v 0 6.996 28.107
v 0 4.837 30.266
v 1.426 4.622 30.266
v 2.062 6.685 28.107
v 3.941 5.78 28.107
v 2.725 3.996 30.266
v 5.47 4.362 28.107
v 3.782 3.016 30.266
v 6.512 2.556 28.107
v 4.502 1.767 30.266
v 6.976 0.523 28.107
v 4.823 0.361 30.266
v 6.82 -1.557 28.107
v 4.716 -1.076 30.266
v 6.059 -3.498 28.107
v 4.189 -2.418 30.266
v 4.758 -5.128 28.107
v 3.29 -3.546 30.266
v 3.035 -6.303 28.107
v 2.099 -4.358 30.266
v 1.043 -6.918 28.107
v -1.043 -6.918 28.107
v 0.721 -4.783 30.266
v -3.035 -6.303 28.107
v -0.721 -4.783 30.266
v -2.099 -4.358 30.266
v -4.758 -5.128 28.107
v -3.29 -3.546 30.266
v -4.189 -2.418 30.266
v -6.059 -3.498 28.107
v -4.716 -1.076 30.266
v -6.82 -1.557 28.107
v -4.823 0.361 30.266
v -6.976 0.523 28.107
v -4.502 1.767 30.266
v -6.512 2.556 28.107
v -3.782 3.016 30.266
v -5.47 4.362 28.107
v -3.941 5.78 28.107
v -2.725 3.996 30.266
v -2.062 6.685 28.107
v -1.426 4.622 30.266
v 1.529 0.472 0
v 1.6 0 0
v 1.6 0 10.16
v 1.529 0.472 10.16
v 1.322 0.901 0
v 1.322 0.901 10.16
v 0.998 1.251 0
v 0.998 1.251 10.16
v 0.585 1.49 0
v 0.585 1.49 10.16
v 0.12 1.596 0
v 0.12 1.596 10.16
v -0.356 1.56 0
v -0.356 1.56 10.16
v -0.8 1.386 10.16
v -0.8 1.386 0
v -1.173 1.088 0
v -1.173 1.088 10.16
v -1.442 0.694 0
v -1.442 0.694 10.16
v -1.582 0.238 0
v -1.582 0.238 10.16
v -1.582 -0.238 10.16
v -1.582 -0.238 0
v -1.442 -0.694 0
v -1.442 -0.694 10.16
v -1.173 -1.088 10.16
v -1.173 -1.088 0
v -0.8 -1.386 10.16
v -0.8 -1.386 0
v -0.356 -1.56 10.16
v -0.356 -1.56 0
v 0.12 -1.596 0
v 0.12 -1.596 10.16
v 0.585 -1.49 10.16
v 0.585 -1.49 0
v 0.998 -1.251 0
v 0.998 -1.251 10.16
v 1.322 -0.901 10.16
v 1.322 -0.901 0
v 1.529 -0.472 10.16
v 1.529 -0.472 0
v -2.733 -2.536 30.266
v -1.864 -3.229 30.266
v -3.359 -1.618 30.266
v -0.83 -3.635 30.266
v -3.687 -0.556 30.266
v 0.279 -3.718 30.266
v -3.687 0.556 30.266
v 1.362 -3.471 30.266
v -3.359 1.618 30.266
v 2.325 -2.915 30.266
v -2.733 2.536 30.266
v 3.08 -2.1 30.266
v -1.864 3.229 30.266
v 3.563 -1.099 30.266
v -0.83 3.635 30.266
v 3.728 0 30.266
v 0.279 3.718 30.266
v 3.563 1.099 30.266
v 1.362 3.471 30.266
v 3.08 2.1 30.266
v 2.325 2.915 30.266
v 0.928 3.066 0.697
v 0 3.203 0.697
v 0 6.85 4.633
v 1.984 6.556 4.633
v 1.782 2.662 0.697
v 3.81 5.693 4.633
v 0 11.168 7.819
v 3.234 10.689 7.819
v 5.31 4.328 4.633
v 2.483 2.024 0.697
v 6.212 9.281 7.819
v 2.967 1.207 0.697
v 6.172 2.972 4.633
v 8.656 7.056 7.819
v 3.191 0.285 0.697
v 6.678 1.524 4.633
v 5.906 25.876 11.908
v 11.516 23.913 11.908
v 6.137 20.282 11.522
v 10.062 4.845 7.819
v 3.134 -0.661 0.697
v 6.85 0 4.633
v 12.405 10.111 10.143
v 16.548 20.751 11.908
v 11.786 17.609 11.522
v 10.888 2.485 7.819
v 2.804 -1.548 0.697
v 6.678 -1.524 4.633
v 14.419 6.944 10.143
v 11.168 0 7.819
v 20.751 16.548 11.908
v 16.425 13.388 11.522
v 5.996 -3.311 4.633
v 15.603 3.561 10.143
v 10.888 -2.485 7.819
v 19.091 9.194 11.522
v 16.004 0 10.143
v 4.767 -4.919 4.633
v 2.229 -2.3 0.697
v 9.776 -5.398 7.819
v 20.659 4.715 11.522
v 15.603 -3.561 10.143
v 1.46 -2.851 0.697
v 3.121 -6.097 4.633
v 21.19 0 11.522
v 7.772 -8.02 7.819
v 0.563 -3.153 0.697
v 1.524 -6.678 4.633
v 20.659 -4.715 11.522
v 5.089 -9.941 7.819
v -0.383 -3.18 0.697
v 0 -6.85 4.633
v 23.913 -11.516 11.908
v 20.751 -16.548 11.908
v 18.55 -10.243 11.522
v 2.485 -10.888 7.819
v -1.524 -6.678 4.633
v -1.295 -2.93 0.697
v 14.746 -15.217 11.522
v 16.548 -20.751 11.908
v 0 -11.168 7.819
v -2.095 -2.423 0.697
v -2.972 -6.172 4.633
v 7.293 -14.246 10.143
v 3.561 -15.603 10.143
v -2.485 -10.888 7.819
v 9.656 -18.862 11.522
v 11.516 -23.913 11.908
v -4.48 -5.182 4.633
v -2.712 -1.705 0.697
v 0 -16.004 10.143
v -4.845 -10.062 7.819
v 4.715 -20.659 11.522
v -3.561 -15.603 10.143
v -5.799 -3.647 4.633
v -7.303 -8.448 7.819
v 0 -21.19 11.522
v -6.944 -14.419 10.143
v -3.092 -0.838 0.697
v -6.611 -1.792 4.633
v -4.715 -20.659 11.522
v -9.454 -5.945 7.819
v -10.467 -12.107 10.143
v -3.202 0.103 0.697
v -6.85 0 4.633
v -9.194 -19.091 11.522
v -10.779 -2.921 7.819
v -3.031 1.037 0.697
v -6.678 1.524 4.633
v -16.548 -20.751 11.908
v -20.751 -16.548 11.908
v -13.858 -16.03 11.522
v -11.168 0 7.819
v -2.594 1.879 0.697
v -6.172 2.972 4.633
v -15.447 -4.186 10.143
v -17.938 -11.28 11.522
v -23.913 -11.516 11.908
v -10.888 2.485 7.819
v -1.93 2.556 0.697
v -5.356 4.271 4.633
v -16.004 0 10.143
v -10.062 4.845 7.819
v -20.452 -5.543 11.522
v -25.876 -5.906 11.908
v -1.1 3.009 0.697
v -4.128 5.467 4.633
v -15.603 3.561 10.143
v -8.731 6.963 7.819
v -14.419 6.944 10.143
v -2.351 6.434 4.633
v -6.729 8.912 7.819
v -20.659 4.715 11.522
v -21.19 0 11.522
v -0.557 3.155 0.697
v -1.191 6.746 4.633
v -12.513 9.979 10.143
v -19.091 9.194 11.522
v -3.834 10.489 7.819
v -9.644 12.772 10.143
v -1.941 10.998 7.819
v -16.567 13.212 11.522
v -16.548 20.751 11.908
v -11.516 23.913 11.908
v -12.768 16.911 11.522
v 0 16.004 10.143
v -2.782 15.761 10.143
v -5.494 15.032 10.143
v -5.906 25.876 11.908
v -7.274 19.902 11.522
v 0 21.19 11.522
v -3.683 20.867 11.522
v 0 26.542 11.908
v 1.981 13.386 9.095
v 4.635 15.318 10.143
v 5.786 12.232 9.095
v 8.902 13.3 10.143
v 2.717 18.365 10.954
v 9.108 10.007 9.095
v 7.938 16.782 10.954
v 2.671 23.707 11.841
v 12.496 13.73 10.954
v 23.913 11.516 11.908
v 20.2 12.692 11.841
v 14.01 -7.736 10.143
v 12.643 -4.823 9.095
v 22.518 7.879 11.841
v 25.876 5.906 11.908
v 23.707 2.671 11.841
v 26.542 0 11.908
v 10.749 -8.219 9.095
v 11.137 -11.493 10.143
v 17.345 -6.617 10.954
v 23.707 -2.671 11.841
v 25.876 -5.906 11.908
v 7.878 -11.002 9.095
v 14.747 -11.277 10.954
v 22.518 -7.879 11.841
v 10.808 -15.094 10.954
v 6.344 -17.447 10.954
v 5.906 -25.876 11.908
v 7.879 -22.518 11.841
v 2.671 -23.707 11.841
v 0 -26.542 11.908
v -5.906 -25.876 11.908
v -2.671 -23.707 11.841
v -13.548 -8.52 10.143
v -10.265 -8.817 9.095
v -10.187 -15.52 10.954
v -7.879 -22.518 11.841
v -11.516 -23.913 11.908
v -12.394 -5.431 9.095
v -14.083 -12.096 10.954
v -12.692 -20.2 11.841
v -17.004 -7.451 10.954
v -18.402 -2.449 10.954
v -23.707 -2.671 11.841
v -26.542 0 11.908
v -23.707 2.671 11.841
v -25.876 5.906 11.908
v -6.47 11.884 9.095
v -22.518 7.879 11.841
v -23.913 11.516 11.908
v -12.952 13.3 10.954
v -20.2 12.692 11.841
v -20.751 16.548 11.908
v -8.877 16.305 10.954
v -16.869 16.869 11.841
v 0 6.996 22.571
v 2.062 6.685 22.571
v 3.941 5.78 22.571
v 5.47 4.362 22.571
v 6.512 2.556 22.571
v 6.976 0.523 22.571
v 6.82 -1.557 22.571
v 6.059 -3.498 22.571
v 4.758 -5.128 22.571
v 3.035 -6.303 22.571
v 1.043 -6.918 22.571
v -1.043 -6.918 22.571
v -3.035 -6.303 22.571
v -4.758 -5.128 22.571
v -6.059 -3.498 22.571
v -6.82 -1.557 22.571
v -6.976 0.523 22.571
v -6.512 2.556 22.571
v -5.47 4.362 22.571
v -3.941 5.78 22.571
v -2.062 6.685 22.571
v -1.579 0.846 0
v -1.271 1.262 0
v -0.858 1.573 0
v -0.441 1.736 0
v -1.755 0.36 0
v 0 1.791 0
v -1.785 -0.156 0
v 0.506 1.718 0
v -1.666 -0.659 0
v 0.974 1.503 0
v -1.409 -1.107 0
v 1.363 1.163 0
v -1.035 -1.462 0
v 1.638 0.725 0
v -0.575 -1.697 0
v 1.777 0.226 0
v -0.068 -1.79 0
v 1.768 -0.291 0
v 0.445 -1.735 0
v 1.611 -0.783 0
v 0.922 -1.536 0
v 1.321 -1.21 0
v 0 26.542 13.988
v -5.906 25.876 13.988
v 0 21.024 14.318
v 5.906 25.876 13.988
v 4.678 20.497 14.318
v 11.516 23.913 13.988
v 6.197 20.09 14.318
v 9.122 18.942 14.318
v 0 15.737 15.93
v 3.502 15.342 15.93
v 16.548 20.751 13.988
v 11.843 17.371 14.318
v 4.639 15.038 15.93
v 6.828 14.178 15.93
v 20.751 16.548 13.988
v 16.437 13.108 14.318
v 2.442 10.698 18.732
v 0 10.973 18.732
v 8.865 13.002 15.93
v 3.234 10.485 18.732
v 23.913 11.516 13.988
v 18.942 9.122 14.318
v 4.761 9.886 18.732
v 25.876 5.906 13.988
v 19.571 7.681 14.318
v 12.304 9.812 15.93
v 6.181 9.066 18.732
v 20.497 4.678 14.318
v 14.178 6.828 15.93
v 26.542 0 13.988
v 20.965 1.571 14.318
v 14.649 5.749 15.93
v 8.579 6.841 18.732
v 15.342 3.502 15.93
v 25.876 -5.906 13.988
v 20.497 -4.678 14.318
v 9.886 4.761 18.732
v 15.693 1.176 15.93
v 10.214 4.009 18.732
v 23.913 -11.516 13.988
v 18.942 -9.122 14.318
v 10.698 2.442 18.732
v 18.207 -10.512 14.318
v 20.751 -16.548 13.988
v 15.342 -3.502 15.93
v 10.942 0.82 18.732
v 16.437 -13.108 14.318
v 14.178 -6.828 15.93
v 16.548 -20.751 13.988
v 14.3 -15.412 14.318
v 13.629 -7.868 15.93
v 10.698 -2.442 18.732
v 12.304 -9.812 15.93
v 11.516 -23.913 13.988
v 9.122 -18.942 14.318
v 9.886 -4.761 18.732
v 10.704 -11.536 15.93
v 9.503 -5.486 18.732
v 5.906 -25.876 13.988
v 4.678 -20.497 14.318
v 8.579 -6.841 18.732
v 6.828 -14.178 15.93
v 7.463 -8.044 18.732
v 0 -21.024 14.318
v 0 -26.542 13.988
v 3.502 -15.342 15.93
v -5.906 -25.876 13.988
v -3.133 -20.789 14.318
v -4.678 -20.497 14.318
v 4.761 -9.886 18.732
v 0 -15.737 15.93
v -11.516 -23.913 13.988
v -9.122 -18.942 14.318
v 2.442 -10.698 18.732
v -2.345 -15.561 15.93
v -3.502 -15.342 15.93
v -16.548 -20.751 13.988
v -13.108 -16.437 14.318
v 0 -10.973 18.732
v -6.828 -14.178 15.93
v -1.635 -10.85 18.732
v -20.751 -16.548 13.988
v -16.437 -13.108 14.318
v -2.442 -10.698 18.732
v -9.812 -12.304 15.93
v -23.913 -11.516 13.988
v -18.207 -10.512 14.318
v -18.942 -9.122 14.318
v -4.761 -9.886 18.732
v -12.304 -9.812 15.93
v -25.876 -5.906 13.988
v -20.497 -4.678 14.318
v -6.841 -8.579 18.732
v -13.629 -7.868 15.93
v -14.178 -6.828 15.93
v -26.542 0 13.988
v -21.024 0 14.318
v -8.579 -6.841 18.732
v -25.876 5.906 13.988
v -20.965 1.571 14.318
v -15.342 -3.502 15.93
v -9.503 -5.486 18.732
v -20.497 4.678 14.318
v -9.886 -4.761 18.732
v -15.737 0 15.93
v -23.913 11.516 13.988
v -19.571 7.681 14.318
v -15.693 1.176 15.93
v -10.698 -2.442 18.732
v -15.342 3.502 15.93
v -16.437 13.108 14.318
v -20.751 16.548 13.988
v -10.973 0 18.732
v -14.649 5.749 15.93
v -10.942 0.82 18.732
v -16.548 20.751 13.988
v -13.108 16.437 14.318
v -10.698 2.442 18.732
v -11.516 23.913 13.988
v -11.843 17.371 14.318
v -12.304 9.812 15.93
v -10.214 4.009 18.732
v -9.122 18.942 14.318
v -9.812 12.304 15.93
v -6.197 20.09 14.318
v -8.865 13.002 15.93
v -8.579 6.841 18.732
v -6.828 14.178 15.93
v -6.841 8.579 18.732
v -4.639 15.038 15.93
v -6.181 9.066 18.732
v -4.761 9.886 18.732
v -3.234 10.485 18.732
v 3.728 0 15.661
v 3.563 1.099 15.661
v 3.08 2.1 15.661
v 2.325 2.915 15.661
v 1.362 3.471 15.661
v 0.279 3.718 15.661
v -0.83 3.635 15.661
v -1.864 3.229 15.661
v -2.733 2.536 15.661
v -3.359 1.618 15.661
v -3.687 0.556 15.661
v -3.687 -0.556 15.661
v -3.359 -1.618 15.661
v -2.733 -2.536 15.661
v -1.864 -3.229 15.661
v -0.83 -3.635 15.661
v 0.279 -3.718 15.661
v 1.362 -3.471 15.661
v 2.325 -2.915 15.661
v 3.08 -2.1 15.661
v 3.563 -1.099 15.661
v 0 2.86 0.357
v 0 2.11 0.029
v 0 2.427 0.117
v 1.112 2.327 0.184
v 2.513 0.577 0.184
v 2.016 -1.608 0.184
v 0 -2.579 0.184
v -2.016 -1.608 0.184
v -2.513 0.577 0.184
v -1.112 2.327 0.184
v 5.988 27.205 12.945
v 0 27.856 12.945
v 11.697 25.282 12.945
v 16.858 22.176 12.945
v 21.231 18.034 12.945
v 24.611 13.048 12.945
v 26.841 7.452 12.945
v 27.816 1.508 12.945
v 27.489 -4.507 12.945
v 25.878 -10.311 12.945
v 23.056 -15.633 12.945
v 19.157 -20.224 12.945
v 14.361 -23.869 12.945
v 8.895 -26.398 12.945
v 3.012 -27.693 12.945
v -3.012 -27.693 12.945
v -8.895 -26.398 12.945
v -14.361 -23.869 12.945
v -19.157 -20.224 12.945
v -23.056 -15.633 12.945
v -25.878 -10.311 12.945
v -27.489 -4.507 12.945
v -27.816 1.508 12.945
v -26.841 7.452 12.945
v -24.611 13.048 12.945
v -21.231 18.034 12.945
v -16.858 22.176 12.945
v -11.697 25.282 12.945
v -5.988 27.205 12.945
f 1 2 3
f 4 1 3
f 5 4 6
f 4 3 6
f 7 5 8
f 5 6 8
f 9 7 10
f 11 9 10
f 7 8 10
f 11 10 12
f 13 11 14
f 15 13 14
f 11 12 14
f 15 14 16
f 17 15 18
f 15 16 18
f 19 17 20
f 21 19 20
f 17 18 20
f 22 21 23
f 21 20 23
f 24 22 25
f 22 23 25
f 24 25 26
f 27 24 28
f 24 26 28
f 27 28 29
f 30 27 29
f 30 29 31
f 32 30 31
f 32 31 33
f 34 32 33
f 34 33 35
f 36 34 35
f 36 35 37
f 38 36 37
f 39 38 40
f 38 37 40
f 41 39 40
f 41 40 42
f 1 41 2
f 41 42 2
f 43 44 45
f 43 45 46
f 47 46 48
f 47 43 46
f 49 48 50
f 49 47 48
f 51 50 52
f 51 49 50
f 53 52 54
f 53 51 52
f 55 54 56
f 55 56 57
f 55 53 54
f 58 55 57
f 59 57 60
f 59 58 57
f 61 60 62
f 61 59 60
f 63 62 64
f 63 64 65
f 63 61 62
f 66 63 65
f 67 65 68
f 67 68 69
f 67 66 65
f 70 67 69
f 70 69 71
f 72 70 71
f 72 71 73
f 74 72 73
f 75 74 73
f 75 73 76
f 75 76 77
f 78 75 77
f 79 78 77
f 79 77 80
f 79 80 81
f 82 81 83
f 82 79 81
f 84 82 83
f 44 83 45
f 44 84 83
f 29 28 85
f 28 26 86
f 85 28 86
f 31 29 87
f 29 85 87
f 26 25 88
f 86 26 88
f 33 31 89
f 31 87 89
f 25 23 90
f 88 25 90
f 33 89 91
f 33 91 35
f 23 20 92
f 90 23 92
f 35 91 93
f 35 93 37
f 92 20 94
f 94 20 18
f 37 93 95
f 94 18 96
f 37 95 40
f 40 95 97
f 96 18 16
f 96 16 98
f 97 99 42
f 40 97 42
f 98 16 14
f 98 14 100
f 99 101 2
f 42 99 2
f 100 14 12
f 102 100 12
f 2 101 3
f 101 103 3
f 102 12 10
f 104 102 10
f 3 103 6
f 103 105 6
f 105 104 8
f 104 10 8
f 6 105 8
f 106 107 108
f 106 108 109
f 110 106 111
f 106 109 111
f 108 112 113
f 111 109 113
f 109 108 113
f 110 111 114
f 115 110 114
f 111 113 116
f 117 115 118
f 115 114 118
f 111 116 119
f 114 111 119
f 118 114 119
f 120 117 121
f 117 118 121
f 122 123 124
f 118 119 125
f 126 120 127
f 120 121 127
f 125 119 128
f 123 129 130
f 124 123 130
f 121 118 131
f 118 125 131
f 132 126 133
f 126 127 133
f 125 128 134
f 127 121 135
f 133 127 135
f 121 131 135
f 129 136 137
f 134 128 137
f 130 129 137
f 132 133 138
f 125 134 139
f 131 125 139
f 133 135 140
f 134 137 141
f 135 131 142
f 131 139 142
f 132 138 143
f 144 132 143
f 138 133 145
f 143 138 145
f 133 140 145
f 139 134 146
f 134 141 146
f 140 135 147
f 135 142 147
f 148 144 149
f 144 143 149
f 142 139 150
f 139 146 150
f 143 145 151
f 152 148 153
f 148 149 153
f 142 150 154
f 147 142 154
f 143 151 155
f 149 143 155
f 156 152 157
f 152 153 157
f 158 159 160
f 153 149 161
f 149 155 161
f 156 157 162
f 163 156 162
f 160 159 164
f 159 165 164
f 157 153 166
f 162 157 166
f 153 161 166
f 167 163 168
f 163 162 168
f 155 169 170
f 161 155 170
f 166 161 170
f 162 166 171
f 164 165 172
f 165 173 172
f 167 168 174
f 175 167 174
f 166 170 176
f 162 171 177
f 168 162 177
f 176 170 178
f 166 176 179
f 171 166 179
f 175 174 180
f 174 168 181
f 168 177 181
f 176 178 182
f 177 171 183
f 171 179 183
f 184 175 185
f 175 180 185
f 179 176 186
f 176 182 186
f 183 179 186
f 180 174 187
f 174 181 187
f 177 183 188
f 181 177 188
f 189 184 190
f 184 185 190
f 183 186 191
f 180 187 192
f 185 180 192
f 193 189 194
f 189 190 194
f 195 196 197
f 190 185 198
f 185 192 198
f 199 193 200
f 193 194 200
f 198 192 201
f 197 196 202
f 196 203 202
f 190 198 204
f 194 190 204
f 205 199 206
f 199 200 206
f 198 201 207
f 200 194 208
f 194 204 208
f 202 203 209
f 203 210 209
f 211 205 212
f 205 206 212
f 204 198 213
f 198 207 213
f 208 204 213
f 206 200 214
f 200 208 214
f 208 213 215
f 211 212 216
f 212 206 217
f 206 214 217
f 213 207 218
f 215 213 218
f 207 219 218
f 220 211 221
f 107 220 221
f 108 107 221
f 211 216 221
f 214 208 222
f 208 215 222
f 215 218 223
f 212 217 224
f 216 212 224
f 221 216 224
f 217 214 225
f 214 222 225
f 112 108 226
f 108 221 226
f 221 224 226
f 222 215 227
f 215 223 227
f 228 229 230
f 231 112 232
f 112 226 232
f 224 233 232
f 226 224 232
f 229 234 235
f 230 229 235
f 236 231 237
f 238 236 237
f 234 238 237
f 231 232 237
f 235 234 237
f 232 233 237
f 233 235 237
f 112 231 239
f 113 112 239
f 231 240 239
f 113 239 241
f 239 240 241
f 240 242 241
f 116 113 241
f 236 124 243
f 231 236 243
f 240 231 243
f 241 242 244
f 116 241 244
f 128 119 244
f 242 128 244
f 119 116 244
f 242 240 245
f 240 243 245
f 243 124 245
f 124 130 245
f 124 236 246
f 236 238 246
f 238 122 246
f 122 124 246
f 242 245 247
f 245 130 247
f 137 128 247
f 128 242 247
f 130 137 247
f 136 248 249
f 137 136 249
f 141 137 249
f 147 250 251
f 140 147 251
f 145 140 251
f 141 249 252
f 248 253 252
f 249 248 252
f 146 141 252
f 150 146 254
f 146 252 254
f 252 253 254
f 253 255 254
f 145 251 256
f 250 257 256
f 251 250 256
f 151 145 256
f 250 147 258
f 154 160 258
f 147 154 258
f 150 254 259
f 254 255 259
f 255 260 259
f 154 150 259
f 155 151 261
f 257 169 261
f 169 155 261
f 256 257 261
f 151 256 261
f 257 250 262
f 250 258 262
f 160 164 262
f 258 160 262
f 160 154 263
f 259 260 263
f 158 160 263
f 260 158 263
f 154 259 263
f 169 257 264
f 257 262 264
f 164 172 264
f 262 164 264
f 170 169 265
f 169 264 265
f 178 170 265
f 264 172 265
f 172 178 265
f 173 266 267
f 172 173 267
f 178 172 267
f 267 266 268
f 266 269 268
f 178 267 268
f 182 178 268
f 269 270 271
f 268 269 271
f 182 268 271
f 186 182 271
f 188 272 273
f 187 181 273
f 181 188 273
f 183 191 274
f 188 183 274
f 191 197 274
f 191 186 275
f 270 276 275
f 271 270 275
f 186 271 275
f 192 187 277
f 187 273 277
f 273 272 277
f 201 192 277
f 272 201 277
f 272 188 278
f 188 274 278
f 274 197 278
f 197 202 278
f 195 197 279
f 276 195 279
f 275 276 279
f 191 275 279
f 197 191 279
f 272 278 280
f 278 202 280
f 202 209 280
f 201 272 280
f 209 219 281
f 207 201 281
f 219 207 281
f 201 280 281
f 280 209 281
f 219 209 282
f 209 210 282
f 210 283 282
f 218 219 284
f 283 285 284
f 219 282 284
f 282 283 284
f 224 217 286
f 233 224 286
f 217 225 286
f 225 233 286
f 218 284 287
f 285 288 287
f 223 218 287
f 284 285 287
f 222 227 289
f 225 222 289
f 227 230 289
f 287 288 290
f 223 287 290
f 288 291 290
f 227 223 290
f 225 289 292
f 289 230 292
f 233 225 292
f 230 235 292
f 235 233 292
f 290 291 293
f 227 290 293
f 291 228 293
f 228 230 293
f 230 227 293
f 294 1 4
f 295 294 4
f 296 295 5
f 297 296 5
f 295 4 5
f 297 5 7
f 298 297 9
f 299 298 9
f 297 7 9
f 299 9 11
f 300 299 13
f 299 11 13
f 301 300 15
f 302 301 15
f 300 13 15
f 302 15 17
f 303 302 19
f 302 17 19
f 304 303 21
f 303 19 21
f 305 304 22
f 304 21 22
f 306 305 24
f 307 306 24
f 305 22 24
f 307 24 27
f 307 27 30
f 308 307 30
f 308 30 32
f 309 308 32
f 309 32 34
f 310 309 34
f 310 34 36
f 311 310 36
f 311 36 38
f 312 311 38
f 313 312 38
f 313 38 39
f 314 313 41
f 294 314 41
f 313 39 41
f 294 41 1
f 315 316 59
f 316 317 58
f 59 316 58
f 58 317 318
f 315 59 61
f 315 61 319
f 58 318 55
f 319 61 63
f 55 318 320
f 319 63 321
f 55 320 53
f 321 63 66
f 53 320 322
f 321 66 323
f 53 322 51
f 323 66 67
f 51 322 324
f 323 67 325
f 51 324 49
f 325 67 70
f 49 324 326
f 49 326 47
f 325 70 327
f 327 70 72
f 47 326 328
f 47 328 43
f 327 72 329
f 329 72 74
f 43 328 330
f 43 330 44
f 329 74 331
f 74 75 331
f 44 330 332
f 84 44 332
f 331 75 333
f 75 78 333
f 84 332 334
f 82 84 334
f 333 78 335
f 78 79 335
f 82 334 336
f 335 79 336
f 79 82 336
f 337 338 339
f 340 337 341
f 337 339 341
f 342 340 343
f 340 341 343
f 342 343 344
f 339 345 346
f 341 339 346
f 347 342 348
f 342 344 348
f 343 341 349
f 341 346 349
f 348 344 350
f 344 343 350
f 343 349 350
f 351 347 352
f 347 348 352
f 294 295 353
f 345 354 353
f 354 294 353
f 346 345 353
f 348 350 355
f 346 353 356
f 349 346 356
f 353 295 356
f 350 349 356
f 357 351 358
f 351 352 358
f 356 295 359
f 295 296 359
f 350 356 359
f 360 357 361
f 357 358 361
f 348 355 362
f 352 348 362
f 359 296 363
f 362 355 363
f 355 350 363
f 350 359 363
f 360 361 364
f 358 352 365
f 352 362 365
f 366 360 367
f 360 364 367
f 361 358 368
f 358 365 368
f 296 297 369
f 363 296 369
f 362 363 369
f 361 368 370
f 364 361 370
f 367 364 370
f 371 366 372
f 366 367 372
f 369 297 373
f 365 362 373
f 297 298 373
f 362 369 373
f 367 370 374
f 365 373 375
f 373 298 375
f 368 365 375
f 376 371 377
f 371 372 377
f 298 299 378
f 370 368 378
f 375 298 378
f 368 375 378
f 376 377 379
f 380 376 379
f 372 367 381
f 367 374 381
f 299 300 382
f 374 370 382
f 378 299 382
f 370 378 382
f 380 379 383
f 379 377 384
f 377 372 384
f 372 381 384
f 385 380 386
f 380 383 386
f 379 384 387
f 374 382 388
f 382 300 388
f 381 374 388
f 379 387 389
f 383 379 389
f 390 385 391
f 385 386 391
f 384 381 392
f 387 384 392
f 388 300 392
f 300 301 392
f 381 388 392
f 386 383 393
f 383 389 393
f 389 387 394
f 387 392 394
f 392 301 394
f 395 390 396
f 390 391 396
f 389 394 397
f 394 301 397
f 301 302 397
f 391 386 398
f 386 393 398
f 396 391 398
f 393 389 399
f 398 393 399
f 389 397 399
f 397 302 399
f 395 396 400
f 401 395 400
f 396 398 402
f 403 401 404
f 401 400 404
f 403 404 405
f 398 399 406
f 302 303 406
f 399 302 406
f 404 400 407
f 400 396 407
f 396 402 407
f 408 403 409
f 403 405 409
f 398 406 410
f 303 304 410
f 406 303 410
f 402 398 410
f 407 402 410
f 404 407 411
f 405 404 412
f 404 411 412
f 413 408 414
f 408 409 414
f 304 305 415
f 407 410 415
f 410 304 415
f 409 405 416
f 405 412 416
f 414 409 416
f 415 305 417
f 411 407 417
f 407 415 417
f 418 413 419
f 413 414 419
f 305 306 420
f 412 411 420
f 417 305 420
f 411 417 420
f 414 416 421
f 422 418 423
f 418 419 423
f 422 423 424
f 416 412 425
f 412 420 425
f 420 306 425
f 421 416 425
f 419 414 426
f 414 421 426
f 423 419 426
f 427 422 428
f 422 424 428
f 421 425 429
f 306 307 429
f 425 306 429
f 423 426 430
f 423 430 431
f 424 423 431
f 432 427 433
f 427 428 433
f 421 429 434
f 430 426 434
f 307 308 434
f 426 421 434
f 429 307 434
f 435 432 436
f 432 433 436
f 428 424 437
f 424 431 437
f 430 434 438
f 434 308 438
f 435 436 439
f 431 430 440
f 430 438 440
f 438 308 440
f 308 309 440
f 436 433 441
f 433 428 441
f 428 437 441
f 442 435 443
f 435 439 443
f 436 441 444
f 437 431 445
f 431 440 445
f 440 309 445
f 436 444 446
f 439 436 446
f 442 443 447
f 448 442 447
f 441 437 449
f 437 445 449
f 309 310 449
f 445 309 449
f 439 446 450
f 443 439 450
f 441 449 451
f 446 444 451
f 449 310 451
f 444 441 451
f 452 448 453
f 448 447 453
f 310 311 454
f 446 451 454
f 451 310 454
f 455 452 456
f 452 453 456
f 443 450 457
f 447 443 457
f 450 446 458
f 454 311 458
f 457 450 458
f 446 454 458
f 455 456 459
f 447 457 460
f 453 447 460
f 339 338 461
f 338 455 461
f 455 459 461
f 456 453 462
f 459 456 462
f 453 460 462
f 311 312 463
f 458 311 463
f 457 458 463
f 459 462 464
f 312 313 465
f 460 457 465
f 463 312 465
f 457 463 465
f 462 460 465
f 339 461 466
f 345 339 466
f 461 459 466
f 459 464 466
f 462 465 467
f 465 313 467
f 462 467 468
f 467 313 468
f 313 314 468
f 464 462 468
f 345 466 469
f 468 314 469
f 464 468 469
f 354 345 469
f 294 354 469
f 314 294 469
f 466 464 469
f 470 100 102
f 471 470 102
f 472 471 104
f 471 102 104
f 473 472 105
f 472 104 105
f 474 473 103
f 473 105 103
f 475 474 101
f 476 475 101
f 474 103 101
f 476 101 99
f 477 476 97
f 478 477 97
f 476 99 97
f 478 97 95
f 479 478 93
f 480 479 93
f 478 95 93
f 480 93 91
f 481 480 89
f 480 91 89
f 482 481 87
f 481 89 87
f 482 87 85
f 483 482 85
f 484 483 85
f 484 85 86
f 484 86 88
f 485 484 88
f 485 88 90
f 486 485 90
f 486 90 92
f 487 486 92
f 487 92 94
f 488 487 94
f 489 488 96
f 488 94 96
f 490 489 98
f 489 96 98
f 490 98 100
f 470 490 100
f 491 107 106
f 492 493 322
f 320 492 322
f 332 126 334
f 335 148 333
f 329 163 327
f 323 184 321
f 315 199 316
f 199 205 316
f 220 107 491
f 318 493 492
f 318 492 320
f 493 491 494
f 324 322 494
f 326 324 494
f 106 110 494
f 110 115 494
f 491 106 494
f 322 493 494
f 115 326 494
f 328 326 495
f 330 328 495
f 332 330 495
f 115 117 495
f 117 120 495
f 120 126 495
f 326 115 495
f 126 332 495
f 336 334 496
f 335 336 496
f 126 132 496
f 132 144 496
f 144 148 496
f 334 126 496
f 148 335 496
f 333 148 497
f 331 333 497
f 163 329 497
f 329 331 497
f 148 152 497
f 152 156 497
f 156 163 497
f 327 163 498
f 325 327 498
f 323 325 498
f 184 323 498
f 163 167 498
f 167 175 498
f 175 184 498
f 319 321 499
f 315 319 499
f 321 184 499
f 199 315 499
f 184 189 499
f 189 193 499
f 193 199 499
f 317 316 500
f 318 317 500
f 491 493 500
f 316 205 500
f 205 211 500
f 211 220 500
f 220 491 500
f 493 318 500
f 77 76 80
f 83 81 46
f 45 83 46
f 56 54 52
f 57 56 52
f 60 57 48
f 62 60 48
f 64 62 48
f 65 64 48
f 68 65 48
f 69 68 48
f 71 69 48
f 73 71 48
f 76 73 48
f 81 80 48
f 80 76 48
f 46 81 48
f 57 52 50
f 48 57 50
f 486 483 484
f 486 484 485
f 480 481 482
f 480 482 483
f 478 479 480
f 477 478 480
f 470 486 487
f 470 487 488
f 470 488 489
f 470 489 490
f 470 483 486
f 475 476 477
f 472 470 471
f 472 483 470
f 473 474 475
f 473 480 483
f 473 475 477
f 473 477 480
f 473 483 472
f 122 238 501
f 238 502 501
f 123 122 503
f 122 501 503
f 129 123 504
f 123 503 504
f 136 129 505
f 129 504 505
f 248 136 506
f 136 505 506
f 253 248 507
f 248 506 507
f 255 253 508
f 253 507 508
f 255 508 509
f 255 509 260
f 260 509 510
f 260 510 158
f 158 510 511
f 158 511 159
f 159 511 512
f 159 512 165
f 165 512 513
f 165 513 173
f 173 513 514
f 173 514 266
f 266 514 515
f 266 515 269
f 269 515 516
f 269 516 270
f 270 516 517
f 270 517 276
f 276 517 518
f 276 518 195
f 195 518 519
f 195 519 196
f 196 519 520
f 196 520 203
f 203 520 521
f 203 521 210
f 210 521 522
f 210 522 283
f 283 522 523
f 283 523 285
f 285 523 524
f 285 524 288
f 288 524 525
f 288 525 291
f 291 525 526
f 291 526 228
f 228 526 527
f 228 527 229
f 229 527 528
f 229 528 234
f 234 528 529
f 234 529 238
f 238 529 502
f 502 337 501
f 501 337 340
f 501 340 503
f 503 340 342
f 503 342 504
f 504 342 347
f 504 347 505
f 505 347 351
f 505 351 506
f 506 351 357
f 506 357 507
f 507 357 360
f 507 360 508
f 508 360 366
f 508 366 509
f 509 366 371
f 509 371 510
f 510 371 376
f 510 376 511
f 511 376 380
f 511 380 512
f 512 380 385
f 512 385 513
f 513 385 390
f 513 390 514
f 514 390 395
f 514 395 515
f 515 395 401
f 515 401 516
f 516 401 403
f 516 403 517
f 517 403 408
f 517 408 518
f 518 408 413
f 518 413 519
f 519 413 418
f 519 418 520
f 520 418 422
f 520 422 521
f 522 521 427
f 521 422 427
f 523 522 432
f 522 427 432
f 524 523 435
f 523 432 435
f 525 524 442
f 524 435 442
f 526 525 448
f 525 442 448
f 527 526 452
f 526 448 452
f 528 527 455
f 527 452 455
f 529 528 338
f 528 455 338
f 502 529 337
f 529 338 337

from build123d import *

# Parameters (mm, degrees)
F2_R      = 4.7625
F3_DEPTH  = 14.605
F4_R      = 1.6002
F5_DEPTH  = 10.16
F6_R      = 4.7752
F7_DEPTH  = 14.605
F8_R      = 3.728231
F9_DEPTH  = 14.605
F10_R     = 1.6002
F11_DEPTH = 10.16
F12_SIZE  = 2.159
F13_R     = 1.778


with BuildPart() as f1:
    # F0 (on Right) → F1 (revolve)
    with BuildSketch(Plane.YZ):
        with BuildLine():
            Line((0, 30.265944), (0, 0))
            Line((0, 0), (2.686187, 0))
            ThreePointArc((2.686187, 0), (13.141494, 8.903682), (26.541598, 11.90805))
            Line((26.541598, 11.90805), (27.856382, 12.945489))
            Line((27.856382, 12.945489), (26.541598, 13.987607))
            ThreePointArc((26.541598, 13.987607), (15.736911, 15.929647), (6.995791, 22.570852))
            Line((6.995791, 22.570852), (6.995791, 30.265944))
            Line((6.995791, 30.265944), (0, 30.265944))
        make_face()
    revolve(axis=Axis((0, 0, 15.132972), (0, 0, -1)))

    # F2 (on face) → F3 (join)
    with BuildSketch(Plane.XY.offset(30.265944)):
        Circle(F2_R)
    extrude(amount=-F3_DEPTH)

    # F4 (on Top) → F5 (join)
    with BuildSketch(Plane.XY):
        Circle(F4_R)
    extrude(amount=F5_DEPTH)

    # F6 (on face) → F7 (join)
    with BuildSketch(Plane.XY.offset(30.265944)):
        Circle(F6_R)
    extrude(amount=-F7_DEPTH)

    # F8 (on face) → F9 (cut)
    with BuildSketch(Plane.XY.offset(30.265944)):
        Circle(F8_R)
    extrude(amount=-F9_DEPTH, mode=Mode.SUBTRACT)

    # F10 (on Top) → F11 (cut)
    with BuildSketch(Plane.XY):
        Circle(F10_R)
    extrude(amount=F11_DEPTH, mode=Mode.SUBTRACT)

    # F12
    f12_edges = [f1.edges().sort_by_distance(p)[0] for p in [
        (0, -6.995791, 30.265944),
    ]]
    chamfer(f12_edges, length=F12_SIZE)

    # F13
    f13_edges = [f1.edges().sort_by_distance(p)[0] for p in [
        (0, -2.686187, 0),
    ]]
    fillet(f13_edges, radius=F13_R)


solid = f1.part
